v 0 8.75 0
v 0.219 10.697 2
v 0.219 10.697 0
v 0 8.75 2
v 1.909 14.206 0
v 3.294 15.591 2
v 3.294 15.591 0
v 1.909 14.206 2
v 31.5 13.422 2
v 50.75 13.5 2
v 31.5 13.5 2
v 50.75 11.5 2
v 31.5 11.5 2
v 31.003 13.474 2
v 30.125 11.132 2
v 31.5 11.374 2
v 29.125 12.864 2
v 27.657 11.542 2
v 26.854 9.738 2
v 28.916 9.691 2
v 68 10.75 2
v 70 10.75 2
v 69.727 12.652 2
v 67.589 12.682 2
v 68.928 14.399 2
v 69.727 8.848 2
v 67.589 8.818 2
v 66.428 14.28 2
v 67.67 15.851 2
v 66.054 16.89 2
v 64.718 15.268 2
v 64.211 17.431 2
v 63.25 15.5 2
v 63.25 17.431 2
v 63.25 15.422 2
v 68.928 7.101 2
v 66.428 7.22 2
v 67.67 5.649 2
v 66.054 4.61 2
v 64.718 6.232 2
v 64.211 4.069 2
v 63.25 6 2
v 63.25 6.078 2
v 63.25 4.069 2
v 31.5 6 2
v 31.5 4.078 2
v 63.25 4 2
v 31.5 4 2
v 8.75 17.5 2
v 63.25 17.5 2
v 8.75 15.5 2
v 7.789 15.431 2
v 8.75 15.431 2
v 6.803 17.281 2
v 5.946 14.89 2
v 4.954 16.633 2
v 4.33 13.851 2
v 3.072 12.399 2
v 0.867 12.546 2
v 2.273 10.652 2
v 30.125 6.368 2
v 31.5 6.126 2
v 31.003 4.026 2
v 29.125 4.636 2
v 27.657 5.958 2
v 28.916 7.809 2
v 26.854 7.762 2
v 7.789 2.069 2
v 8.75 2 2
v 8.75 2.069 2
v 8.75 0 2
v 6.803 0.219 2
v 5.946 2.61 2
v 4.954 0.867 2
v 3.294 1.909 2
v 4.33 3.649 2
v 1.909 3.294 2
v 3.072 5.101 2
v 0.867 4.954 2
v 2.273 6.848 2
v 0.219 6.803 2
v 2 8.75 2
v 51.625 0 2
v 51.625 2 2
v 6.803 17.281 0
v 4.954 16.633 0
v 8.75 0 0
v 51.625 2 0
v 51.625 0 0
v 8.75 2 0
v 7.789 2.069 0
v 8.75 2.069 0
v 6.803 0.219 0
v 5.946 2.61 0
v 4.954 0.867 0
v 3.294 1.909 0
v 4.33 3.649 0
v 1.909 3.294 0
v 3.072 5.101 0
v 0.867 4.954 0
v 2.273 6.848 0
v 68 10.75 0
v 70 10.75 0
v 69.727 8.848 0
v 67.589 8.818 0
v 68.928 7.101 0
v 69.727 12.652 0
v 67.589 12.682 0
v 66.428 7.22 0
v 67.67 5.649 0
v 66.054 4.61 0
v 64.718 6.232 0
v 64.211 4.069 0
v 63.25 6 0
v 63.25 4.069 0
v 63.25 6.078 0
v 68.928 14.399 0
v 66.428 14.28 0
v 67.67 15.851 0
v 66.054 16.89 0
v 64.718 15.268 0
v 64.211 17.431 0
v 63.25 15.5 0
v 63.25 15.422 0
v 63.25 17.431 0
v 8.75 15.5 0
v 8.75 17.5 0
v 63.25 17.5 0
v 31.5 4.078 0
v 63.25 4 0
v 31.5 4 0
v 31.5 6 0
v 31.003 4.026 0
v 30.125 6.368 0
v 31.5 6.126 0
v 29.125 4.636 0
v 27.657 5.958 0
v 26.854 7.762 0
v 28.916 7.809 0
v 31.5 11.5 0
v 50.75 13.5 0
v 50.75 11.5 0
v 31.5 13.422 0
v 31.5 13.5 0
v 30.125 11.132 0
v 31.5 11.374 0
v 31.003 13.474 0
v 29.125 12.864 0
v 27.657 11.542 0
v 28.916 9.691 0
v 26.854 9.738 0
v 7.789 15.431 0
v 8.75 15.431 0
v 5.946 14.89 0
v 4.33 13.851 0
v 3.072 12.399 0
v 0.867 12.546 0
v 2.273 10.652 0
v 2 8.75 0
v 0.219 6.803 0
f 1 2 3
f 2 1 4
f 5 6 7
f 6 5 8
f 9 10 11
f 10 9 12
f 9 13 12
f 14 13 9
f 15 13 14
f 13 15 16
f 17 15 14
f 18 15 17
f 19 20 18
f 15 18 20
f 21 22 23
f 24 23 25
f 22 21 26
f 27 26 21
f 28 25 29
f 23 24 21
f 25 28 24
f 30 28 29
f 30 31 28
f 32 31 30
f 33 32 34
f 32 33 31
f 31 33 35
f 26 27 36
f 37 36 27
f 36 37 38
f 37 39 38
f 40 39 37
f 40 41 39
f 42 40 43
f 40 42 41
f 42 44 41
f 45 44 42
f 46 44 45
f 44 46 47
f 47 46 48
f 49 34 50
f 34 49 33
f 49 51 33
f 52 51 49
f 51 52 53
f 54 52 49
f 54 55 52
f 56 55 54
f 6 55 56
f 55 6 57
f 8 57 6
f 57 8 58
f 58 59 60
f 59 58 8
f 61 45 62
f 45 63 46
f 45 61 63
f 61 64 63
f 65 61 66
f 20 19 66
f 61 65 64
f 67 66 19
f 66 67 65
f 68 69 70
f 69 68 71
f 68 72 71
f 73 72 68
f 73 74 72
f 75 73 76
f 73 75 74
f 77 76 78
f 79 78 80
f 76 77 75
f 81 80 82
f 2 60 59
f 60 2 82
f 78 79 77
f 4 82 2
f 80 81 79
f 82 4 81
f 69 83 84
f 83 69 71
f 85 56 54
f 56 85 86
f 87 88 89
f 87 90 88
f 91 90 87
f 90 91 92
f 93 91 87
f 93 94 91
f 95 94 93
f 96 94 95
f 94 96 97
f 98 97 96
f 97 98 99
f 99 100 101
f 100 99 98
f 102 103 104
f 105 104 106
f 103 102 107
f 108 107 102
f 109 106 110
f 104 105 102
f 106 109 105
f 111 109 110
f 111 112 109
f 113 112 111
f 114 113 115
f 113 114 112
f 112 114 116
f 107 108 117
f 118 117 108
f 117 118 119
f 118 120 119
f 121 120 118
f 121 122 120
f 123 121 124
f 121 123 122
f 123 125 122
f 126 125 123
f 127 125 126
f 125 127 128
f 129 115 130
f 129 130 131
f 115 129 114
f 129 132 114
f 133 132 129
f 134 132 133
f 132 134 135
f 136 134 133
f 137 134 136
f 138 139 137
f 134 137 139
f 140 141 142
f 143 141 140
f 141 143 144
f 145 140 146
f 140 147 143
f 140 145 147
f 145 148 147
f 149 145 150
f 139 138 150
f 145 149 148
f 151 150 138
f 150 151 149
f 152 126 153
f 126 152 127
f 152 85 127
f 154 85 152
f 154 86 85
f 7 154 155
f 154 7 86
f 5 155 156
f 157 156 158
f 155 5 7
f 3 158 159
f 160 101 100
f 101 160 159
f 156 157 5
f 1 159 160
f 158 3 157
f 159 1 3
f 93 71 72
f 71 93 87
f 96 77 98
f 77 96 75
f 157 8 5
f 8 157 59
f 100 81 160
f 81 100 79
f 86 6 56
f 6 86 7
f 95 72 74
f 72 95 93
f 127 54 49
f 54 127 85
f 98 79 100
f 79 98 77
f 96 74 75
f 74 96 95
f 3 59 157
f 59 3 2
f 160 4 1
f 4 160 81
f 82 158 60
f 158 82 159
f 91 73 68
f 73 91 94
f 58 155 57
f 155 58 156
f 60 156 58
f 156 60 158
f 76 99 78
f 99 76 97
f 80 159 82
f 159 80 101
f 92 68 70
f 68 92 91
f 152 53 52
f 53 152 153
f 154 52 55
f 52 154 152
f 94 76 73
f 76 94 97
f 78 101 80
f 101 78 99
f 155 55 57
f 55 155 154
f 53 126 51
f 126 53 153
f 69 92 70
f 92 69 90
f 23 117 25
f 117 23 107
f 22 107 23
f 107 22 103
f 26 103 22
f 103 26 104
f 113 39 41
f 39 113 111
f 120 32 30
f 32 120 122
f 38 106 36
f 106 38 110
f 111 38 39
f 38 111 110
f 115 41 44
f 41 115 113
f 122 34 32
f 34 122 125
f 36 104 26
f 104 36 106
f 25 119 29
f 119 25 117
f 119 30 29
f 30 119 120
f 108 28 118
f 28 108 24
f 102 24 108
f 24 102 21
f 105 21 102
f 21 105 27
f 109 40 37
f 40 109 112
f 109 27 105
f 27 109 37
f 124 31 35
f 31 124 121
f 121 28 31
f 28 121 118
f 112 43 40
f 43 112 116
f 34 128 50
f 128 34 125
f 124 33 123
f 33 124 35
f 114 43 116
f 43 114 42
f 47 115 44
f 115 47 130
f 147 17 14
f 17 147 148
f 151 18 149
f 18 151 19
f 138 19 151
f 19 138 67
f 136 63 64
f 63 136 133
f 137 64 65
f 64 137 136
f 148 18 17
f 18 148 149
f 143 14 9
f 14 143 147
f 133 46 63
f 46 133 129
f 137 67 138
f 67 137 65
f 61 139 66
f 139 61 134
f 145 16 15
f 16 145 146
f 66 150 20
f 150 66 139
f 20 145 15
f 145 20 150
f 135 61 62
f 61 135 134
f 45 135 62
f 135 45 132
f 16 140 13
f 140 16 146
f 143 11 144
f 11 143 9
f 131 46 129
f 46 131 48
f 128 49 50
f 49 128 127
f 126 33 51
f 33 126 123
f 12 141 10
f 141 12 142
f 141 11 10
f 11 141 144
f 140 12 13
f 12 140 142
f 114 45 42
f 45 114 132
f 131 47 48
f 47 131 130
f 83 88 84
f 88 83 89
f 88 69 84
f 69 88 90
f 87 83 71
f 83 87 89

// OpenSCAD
/* [Paperclip Specs] */


//length of clip (mm)
clip_length = 70;

//height of clip as a percentage of total length
clip_width_percentage = 25; //[1:100]

//Thickness of wire
wire_diameter = 2;

//Centre curve position as a percentage of total length (from left) 
centre_loop_percent_offset = 45; //[1:100] 

//Wire end position as a percentage of total length
end_wire_length_percent = 50; //[1:100]

//Wire start position as a percentage of total length
start_wire_length_percent = 70; //[1:100]

/* [Hidden] */
clip_width = clip_length * (clip_width_percentage / 100);

ll_out_r = clip_width / 2;
ll_out_x = clip_width / 2; 
ll_out_y = clip_width / 2; 

ll_in_r = (clip_width / 2) - wire_diameter;
ll_in_x = ll_out_x;
ll_in_y = ll_out_y;

rl_out_r = ll_out_r -  wire_diameter;
rl_out_x = clip_length - rl_out_r;
rl_out_y = clip_width - rl_out_r;

rl_in_r =  rl_out_r - wire_diameter;
rl_in_x = rl_out_x;
rl_in_y = rl_out_y;

cl_out_r = rl_out_r -  wire_diameter;
cl_out_x = ((centre_loop_percent_offset) / 100) * clip_length;
cl_out_y = rl_out_y - wire_diameter;

cl_in_r = rl_out_r - wire_diameter - wire_diameter;
cl_in_x = cl_out_x;
cl_in_y = cl_out_y;

arm_1_w = clip_length - ll_out_r - rl_out_r;
arm_1_h = wire_diameter;
arm_1_x = ll_out_r;
arm_1_y = clip_width - wire_diameter;

arm_2_w = (clip_length - cl_in_x) * (end_wire_length_percent / 100);
arm_2_h = wire_diameter;
arm_2_x = cl_in_x;
arm_2_y = cl_in_y + cl_in_r;

arm_3_w = (clip_length - cl_out_x - rl_out_r);
arm_3_h = wire_diameter;
arm_3_x = arm_2_x;
arm_3_y = arm_2_y - (cl_in_r * 2) - wire_diameter;

arm_4_w = (clip_length - ll_out_r) * (start_wire_length_percent / 100);
arm_4_h = wire_diameter;
arm_4_x = rl_out_r + wire_diameter;
arm_4_y = 0;
module left_loop() {
    difference() {
        difference() {
            translate([ll_out_x, ll_out_y, 0])
                cylinder(wire_diameter, ll_out_r, ll_out_r, false);

            translate([ll_in_x, ll_in_y, -1])
                cylinder(wire_diameter+2, ll_in_r, ll_in_r, false);
        }

        translate([ll_out_x, 0, -ll_out_r])
            cube(ll_out_r * 2);
    }
}

module right_loop() {
    difference() {
        difference() {
            translate([rl_out_x, rl_out_y, 0])
                cylinder(wire_diameter, rl_out_r, rl_out_r, false);

            translate([rl_in_x, rl_in_y, -1])
                cylinder(wire_diameter+2, rl_in_r, rl_in_r, false);
        }
        translate([clip_length - (rl_out_r * 3), clip_width-(rl_out_r*2), -rl_out_r])
            cube(rl_out_r * 2);
    }

}

module centre_loop() {
    difference() {
        difference() {
            translate([cl_out_x, cl_out_y, 0])
                cylinder(wire_diameter, cl_out_r, cl_out_r, false);

            translate([cl_in_x, cl_in_y, -1])
                cylinder(wire_diameter+2, cl_in_r, cl_in_r, false);
        }

        translate([cl_out_x, (cl_out_y-cl_out_r), -cl_out_r])
            cube(cl_out_r * 2);
    }
}

module arm_1() {
    translate([arm_1_x, arm_1_y, 0])
        cube([arm_1_w, arm_1_h, wire_diameter]);
}

module arm_2() {
    translate([arm_2_x, arm_2_y, 0])
        cube([arm_2_w, arm_2_h, wire_diameter]);
}

module arm_3() {
    translate([arm_3_x, arm_3_y, 0])
        cube([arm_3_w, arm_3_h, wire_diameter]);
}

module arm_4() {
    translate([arm_4_x, arm_4_y, 0])
        cube([arm_4_w, arm_4_h, wire_diameter]);
}


union() {
    left_loop();
    right_loop();
    centre_loop();
    arm_1();
    arm_2();
    arm_3();
    arm_4();
}
